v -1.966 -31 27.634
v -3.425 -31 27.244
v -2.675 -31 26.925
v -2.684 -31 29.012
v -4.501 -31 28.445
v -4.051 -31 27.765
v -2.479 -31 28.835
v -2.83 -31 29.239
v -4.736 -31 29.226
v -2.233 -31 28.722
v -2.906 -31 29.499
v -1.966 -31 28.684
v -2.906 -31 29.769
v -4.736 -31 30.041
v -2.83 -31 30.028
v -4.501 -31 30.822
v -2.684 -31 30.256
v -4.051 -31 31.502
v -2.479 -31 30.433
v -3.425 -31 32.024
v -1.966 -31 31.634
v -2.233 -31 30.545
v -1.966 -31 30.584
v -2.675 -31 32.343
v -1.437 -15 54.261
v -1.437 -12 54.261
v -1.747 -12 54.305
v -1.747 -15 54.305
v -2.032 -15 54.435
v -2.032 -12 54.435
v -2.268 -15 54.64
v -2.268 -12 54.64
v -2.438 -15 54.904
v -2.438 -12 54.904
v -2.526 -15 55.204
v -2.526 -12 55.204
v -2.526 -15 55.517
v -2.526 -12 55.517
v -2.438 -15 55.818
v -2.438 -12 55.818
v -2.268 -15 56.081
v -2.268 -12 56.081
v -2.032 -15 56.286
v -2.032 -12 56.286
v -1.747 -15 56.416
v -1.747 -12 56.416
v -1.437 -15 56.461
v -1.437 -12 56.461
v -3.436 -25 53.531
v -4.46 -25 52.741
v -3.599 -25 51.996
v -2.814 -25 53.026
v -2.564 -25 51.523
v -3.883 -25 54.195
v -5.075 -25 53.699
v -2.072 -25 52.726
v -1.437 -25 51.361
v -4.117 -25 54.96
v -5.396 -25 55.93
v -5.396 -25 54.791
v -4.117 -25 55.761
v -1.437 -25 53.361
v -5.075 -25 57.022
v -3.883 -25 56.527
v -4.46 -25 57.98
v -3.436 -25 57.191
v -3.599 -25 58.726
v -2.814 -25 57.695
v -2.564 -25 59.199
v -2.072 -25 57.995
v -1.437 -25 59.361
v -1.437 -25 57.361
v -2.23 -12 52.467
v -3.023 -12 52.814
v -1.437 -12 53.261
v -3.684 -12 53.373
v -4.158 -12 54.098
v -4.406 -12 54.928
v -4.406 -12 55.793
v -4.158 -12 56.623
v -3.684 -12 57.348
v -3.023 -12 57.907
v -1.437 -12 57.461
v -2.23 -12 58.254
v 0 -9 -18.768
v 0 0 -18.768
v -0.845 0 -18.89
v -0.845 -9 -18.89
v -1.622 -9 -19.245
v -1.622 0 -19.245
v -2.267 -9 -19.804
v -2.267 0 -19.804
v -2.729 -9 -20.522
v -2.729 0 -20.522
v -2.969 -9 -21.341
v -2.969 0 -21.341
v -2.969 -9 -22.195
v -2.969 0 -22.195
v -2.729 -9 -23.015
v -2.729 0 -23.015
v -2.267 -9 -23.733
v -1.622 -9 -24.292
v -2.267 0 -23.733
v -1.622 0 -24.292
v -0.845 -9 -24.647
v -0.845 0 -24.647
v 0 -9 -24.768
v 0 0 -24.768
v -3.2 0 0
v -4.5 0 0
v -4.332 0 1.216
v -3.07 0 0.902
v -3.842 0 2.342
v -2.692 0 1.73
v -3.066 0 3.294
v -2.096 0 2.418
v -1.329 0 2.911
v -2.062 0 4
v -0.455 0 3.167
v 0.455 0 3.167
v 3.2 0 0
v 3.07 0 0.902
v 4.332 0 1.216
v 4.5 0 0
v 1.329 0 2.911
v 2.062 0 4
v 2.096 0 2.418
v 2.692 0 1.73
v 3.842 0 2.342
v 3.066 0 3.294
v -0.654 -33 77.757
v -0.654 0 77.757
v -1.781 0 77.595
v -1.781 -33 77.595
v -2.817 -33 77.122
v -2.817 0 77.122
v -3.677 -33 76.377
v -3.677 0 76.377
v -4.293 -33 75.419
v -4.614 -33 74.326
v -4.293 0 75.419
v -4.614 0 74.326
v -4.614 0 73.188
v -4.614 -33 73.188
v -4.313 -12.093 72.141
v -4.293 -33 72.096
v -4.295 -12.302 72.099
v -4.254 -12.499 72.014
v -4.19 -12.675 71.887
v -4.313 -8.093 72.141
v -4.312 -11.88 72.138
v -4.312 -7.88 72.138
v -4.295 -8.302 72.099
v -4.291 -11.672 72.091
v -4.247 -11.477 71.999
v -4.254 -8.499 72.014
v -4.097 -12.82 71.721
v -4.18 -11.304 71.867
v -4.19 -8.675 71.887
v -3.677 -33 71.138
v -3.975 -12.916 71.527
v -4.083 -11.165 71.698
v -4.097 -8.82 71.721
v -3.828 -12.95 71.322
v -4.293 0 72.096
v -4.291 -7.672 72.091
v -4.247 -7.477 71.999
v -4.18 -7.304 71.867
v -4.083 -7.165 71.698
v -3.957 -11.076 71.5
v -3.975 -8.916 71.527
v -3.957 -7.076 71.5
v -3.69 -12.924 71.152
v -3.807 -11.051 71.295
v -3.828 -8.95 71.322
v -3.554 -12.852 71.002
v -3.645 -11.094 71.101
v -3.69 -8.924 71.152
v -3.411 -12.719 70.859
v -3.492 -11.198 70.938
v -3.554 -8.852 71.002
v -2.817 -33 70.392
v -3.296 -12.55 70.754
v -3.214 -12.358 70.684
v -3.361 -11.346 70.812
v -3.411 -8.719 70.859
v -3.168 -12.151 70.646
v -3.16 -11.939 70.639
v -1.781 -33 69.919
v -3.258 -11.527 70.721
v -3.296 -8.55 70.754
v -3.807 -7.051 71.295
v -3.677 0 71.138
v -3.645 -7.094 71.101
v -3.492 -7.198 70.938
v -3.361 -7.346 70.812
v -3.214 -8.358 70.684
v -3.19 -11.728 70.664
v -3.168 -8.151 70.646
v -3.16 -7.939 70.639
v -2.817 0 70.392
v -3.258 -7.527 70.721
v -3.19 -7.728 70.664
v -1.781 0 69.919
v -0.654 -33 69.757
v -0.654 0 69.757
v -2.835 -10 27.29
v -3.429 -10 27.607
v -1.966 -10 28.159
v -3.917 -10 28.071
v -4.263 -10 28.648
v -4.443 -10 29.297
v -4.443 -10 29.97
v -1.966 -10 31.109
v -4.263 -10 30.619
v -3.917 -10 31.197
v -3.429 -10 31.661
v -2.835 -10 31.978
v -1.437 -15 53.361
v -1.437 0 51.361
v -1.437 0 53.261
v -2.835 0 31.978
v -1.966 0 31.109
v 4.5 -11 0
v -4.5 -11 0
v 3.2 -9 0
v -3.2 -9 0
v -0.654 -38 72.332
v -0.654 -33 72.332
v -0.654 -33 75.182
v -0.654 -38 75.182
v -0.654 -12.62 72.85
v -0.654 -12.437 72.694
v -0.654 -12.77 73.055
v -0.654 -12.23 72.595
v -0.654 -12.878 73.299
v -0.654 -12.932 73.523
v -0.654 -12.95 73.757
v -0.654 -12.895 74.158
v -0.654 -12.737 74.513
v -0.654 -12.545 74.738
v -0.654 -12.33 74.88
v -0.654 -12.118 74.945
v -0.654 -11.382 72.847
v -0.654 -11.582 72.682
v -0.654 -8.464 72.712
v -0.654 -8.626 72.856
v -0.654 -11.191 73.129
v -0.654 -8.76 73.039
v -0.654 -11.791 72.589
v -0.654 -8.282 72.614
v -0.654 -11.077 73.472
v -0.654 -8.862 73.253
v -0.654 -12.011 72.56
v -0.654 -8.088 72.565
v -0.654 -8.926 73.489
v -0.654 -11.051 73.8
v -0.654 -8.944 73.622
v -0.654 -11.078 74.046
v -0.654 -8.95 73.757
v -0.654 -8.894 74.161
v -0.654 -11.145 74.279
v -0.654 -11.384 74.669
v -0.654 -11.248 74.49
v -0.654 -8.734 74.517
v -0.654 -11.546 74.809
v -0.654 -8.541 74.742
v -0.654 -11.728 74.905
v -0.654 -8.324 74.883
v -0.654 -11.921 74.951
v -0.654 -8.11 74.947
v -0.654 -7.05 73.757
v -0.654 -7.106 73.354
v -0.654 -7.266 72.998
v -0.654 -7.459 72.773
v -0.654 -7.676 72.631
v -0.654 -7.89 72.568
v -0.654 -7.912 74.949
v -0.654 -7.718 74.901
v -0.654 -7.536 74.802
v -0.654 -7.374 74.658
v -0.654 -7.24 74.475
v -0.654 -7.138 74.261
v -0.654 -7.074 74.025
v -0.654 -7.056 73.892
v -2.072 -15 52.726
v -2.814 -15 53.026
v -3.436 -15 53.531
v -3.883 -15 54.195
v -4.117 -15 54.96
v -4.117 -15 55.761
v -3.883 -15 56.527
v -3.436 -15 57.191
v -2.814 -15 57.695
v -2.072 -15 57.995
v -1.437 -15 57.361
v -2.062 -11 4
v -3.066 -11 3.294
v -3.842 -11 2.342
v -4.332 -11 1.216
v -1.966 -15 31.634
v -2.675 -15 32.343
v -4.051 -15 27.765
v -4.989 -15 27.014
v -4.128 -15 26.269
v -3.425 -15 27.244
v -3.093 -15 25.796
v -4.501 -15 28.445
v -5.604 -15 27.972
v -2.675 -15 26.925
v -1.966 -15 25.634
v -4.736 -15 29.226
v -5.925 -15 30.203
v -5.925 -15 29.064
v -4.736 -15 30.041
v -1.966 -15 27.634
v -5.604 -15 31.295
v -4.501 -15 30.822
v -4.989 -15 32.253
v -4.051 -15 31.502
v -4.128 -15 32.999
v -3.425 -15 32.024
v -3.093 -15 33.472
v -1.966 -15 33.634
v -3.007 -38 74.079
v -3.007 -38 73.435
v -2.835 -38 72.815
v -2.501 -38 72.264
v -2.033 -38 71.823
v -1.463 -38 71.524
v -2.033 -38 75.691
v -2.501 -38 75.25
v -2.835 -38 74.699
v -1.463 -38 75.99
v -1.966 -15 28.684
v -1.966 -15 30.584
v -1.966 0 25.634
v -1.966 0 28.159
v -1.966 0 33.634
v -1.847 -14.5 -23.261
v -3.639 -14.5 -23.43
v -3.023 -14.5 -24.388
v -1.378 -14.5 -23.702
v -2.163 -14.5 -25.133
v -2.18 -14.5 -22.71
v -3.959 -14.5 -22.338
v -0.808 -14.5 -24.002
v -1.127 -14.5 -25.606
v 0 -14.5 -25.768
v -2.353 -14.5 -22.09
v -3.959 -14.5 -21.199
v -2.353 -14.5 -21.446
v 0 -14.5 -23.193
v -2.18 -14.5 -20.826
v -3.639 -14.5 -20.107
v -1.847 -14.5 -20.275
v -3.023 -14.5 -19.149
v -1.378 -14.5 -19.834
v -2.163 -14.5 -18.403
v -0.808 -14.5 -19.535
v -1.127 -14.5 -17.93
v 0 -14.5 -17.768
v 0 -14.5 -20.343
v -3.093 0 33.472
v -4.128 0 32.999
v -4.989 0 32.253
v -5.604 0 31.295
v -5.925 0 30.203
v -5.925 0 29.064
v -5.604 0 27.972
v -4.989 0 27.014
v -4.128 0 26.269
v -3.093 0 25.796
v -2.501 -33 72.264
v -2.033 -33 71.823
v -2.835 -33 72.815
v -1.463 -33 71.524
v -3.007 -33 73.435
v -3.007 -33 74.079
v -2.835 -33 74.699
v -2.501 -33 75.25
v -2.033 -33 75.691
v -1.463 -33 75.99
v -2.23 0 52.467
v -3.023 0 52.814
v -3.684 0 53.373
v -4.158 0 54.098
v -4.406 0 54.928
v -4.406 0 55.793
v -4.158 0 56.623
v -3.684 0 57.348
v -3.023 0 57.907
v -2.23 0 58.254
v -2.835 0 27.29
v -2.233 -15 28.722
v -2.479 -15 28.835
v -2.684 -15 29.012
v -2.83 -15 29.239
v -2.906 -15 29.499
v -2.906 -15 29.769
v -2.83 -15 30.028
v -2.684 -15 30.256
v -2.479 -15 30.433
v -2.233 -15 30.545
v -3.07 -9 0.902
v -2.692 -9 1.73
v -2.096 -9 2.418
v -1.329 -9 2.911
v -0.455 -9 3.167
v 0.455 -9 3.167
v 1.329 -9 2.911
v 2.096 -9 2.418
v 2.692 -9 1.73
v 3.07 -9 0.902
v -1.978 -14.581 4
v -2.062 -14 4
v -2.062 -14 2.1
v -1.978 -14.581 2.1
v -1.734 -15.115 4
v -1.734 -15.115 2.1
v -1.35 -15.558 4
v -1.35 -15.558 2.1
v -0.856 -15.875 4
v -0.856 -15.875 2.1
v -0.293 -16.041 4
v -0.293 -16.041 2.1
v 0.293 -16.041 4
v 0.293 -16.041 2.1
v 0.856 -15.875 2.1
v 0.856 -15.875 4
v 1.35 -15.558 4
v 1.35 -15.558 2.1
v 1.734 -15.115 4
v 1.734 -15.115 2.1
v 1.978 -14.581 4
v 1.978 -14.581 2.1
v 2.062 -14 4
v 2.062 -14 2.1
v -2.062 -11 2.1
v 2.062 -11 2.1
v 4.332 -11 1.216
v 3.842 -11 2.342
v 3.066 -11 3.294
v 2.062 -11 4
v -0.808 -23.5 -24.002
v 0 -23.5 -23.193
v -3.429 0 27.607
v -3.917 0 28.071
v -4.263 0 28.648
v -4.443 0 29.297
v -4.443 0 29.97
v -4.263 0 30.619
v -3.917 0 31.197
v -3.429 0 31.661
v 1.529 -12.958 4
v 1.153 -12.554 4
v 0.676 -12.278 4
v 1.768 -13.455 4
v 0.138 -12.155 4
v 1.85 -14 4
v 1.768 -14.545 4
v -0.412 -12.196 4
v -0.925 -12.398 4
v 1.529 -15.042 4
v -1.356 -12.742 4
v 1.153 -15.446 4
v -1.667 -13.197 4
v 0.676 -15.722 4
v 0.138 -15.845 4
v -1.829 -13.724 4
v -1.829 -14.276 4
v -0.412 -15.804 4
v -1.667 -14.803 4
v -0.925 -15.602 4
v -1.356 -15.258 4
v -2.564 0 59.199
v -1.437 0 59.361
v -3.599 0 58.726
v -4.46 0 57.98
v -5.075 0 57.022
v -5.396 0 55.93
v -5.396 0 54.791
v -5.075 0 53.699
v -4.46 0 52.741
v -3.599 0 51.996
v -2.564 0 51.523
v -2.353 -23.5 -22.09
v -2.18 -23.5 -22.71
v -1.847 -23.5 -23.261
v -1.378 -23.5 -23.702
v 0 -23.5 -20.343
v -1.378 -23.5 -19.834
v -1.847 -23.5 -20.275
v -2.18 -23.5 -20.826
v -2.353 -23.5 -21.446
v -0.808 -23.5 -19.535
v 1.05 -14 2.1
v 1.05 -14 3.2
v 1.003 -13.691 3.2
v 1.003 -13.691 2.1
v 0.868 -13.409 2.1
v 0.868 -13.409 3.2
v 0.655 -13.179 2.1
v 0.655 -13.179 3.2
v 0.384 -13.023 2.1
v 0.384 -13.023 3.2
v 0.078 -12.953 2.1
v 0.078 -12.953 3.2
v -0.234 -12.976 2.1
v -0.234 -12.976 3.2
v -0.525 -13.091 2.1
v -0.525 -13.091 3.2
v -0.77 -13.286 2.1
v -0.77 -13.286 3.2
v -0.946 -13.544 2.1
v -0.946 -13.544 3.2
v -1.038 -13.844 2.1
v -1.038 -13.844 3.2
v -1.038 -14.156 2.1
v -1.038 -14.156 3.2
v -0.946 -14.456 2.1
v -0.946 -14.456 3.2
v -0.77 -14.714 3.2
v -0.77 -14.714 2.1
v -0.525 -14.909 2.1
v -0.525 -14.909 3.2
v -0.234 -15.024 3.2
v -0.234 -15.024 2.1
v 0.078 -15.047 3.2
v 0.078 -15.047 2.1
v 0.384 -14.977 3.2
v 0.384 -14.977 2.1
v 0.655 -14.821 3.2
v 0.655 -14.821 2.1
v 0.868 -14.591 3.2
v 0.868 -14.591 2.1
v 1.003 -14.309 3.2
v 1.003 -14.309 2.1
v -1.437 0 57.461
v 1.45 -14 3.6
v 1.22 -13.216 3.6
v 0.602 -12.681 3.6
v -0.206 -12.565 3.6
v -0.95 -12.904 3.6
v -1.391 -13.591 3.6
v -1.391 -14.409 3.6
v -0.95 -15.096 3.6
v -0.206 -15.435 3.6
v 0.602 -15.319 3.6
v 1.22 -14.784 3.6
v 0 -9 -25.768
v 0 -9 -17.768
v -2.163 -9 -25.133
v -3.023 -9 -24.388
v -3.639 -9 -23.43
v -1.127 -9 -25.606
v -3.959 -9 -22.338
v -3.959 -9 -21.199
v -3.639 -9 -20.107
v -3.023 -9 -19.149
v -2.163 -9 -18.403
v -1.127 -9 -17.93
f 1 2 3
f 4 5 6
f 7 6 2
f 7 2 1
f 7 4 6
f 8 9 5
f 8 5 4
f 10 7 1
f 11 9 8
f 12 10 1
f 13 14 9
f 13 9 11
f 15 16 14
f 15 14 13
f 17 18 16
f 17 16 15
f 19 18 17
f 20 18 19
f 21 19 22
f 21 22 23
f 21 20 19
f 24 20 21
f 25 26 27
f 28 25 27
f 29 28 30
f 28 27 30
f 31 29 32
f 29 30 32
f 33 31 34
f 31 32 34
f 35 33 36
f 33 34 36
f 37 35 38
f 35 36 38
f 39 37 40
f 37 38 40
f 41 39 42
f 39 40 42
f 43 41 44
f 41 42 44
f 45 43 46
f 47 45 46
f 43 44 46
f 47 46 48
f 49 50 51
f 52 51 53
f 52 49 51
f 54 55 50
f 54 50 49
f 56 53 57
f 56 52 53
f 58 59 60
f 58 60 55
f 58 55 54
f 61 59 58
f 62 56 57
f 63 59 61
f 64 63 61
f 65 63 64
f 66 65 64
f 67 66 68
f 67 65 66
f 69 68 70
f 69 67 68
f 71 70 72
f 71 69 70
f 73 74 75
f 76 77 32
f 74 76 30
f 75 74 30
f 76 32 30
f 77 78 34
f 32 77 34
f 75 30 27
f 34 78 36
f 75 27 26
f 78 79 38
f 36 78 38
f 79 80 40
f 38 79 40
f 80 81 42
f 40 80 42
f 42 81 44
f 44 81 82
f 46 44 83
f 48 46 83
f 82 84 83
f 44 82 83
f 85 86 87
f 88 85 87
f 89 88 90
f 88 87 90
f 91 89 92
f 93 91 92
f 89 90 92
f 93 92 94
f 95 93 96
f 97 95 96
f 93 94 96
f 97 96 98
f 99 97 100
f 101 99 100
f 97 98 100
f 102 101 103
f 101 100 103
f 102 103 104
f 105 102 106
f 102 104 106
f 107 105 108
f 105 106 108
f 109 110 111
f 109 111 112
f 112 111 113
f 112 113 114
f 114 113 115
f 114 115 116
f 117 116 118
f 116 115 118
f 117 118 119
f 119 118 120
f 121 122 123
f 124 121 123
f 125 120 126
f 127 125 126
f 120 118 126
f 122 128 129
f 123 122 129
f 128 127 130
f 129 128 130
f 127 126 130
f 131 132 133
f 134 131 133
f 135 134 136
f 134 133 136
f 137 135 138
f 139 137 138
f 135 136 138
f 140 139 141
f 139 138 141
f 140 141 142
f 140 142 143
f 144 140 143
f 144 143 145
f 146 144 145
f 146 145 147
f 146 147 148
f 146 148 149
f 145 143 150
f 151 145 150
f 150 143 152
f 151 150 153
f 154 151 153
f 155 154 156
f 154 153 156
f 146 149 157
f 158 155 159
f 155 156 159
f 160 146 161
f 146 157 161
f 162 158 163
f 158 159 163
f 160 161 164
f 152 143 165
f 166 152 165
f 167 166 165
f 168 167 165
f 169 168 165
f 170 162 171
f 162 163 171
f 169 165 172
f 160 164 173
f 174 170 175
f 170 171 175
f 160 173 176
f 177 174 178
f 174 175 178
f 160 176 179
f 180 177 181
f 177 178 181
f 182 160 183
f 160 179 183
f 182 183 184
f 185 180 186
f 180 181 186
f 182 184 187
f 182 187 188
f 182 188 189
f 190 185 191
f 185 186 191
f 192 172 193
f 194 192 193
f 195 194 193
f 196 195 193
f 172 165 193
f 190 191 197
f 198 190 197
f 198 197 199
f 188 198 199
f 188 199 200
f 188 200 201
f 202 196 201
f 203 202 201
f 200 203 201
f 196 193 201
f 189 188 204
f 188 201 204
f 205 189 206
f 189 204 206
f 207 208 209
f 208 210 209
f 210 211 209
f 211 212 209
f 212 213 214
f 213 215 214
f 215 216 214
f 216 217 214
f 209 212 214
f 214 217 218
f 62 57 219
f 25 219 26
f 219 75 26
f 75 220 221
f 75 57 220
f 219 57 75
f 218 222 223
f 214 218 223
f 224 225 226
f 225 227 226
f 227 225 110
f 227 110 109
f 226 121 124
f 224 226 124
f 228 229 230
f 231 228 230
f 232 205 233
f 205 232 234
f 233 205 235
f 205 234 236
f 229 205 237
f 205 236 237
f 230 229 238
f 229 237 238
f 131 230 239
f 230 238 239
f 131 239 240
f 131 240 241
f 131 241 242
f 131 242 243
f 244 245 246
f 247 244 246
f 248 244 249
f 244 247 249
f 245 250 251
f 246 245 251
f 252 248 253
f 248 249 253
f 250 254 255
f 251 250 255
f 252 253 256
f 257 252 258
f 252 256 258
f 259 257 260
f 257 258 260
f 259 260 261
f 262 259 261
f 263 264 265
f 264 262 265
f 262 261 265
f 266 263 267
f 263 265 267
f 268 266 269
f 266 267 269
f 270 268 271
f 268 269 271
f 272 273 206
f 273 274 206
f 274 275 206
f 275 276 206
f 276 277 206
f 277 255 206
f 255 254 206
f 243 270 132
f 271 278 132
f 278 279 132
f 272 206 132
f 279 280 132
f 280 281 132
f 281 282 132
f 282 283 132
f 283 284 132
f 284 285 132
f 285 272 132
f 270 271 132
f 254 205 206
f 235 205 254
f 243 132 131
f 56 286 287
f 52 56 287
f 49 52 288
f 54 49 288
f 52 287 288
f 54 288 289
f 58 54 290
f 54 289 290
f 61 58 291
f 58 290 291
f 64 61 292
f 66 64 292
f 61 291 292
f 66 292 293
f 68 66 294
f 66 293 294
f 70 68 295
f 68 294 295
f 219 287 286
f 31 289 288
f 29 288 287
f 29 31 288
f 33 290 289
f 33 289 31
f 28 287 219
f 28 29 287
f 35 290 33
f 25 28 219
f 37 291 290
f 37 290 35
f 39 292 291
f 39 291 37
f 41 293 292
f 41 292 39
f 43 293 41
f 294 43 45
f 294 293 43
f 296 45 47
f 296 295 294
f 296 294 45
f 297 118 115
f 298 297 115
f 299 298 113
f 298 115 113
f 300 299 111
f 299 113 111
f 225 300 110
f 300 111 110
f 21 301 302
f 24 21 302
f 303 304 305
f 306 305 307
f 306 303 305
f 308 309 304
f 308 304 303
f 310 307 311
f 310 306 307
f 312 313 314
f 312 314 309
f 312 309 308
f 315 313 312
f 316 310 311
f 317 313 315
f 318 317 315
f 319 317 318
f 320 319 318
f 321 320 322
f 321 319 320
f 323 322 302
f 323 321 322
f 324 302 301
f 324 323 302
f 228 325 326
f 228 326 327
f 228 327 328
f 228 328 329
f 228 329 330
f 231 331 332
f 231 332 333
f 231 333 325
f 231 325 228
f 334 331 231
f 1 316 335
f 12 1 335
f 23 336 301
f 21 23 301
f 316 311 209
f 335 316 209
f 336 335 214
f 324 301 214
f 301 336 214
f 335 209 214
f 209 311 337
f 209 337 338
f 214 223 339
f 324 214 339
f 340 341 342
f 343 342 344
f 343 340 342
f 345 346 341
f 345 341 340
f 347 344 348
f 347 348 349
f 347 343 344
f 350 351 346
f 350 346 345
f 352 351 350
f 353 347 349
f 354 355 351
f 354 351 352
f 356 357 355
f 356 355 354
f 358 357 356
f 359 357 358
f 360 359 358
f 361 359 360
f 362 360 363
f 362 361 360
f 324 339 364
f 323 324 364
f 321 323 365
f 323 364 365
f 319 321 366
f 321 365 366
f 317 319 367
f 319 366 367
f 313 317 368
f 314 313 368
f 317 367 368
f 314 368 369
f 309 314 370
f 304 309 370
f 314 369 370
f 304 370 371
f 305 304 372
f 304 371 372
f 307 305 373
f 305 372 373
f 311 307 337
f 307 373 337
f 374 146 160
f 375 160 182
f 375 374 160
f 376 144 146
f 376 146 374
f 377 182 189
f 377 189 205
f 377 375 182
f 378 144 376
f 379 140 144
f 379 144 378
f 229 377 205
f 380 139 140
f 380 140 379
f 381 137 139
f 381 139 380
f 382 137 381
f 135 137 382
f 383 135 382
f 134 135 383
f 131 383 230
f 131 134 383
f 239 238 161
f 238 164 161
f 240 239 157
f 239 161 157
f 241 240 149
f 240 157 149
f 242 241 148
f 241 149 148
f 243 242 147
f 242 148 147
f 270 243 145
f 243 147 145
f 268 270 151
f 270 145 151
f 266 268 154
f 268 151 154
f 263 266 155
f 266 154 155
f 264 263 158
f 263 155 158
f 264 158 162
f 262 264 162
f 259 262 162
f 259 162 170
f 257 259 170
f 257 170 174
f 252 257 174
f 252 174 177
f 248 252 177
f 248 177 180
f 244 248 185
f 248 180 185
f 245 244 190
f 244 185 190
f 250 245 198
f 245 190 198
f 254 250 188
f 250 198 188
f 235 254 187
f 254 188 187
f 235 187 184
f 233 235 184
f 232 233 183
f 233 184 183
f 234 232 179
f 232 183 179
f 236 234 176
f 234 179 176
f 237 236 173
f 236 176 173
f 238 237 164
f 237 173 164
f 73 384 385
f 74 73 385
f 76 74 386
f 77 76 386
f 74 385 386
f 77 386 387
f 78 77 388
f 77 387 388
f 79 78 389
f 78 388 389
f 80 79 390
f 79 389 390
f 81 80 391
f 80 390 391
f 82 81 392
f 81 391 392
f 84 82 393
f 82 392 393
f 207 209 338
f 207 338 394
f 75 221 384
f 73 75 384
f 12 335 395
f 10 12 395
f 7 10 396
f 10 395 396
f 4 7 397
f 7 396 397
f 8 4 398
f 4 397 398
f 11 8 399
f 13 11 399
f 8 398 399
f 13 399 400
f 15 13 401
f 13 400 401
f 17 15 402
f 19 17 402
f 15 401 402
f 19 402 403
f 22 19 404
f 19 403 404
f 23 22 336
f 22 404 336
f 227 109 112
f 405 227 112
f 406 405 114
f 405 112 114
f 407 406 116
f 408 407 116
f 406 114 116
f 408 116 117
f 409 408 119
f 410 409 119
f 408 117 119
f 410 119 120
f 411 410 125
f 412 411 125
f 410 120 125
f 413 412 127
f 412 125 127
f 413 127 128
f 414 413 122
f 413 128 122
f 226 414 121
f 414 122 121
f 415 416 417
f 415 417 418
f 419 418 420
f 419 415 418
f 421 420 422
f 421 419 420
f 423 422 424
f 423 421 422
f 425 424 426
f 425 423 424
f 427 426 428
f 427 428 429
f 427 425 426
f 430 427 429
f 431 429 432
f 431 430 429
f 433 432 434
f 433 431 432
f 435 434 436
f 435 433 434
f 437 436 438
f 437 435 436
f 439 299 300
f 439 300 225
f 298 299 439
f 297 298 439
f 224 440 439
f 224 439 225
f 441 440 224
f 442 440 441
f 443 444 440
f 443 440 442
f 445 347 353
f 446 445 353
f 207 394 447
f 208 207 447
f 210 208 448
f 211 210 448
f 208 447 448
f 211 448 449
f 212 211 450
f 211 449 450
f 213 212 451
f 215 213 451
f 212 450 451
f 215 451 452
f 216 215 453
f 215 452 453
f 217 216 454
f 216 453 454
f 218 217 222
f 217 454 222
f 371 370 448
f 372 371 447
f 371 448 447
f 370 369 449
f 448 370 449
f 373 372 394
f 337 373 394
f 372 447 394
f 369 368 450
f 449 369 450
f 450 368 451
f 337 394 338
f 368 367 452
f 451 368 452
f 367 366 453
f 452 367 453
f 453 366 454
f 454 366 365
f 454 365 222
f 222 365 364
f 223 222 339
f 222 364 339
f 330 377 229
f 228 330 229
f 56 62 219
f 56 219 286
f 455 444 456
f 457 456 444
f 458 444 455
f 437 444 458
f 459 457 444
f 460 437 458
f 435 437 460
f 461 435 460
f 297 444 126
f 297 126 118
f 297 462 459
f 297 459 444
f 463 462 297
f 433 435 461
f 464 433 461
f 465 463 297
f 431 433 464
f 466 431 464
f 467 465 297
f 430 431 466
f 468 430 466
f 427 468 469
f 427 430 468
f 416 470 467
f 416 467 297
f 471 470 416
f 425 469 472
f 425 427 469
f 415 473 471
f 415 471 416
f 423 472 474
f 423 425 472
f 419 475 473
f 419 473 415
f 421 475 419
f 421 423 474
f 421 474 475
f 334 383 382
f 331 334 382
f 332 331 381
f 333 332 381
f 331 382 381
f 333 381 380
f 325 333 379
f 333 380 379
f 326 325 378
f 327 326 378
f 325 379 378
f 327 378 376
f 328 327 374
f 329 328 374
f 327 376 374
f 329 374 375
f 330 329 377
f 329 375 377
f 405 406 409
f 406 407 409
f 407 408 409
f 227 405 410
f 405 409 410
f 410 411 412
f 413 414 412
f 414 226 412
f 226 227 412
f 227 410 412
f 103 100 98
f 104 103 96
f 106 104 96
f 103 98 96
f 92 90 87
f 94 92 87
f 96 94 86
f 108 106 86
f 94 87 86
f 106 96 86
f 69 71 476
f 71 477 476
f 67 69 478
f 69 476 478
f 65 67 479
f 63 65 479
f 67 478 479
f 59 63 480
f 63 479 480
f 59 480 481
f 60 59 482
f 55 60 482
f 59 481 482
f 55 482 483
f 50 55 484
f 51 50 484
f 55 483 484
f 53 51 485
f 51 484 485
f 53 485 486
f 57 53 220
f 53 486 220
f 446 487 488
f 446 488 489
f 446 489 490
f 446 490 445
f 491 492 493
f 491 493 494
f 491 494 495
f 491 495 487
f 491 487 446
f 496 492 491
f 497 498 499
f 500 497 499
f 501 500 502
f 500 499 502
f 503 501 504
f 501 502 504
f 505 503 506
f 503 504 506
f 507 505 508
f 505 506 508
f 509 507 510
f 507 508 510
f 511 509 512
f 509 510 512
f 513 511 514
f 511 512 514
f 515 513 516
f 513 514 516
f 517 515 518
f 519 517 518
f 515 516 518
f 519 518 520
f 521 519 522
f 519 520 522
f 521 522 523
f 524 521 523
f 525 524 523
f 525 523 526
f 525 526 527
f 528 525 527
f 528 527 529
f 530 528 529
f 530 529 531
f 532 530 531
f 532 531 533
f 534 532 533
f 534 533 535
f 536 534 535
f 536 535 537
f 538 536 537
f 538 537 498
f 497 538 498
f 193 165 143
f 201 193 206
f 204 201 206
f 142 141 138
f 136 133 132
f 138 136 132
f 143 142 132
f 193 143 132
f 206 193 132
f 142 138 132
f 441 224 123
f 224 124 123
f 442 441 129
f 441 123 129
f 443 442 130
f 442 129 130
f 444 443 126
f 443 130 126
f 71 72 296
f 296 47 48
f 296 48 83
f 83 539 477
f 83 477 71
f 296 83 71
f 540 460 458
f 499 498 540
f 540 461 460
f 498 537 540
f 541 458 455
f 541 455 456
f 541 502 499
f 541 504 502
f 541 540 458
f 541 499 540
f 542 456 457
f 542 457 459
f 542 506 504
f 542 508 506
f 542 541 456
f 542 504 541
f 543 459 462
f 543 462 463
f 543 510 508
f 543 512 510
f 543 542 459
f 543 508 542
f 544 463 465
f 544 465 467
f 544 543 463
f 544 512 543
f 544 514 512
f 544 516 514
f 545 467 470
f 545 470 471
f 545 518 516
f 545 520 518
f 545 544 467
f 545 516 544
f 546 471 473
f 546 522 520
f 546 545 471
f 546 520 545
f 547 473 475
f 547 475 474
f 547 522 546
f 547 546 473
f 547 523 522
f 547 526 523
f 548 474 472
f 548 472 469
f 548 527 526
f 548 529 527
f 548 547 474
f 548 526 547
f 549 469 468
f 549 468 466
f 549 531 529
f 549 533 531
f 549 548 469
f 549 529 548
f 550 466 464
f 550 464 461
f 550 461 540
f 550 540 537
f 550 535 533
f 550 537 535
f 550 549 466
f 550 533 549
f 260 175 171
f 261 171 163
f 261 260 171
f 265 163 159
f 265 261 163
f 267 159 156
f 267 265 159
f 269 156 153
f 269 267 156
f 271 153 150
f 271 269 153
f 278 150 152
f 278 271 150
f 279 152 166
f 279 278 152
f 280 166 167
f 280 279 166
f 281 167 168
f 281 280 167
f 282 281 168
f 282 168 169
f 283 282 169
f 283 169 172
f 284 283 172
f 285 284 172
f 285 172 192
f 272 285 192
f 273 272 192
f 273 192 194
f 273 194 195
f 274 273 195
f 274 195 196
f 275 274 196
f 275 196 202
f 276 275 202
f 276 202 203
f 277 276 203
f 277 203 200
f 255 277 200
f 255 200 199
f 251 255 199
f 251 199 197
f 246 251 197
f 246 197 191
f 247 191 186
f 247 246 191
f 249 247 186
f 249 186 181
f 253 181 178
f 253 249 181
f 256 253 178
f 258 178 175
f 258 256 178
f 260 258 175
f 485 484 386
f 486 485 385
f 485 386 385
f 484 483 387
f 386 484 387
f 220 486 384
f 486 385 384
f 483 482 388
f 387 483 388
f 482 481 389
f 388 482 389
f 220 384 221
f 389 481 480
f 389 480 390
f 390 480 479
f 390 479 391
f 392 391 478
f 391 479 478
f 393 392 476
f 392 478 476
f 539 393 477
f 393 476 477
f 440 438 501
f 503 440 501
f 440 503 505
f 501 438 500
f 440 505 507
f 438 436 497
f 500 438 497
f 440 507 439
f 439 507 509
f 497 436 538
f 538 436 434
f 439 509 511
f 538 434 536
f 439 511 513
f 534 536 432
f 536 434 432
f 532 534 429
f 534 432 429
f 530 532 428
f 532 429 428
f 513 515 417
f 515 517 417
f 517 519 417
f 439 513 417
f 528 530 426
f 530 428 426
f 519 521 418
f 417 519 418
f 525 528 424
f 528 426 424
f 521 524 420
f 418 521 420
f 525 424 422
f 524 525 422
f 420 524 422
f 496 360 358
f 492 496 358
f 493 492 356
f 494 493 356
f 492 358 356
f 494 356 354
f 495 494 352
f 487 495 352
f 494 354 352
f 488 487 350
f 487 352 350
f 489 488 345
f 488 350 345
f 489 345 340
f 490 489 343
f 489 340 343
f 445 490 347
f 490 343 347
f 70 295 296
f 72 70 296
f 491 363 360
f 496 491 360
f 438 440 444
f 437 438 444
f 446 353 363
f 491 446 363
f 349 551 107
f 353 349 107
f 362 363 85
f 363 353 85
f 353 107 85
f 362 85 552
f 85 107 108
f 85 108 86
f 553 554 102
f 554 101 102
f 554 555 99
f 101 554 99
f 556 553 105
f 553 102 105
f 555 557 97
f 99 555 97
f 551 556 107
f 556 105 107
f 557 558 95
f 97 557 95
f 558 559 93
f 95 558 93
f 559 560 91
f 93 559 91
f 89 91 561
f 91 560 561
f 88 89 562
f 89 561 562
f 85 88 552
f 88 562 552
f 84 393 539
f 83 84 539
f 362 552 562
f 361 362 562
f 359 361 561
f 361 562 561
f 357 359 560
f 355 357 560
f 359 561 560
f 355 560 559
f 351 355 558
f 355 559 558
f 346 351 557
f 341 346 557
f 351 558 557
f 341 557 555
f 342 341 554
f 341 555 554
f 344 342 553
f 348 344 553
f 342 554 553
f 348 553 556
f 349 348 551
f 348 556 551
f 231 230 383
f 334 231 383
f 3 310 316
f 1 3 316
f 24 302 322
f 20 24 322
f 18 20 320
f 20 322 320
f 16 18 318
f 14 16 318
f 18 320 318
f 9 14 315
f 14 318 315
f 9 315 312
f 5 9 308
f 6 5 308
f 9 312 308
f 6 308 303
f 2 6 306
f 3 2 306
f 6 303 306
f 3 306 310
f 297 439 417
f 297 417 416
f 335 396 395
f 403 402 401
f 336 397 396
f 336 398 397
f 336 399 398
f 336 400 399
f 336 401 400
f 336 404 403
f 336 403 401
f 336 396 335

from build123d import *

# Parameters (mm, degrees)
F1_DEPTH      = 9
F3_DEPTH      = 2
F4_W          = 4.1231056256
F4_H          = 1.9
F5_DEPTH      = 3
F6_W          = 2.0615528128
F6_H          = 1.9
F8_R          = 1.05
F9_DEPTH      = 2
F9_DEPTH_BACK = 25
F11_DEPTH     = 9
F13_DEPTH     = 5.5
F15_DEPTH     = 9
F17_DEPTH     = 10
F19_DEPTH     = 5
F21_DEPTH     = 16
F23_DEPTH     = 12
F25_DEPTH     = 3
F27_DEPTH     = 10
F29_DEPTH     = 33
F31_DEPTH     = 5
F32_SIZE      = 0.8
F35_R         = 0.95
F36_DEPTH     = 12.5


with BuildPart() as f1:
    # F0 (on Front) → F1 (new body)
    with BuildSketch(Plane.XZ):
        with BuildLine():
            Line((2.0615528128, 4), (0, 4))
            Line((0, 4), (-2.0615528128, 4))
            ThreePointArc((-2.0615528128, 4), (-3.8423292192, 2.3423292192), (-4.5, 0))
            Line((-4.5, 0), (-3.2, 0))
            ThreePointArc((-3.2, 0), (0, 3.2), (3.2, 0))
            Line((3.2, 0), (4.5, 0))
            ThreePointArc((4.5, 0), (3.8423292192, 2.3423292192), (2.0615528128, 4))
        make_face()
    extrude(amount=F1_DEPTH)

    # F2 (on face) → F3 (join)
    with BuildSketch(Plane.XZ.offset(9)):
        with BuildLine():
            ThreePointArc((-2.0615528128, 4), (-3.8423292192, 2.3423292192), (-4.5, 0))
            Line((-4.5, 0), (4.5, 0))
            ThreePointArc((4.5, 0), (3.8423292192, 2.3423292192), (2.0615528128, 4))
            Line((2.0615528128, 4), (-2.0615528128, 4))
        make_face()
    extrude(amount=F3_DEPTH)

    # F4 (on face) → F5 (join)
    with BuildSketch(Plane.XZ.offset(11)):
        with Locations((0, 3.05)):
            Rectangle(F4_W, F4_H)
    extrude(amount=F5_DEPTH)

    # F6 (on face) → F7 (revolve)
    with BuildSketch(Plane.XZ.offset(14)):
        with Locations((-1.0307764064, 3.05)):
            Rectangle(F6_W, F6_H)
    revolve(axis=Axis((0, -14, 3.05), (0, 0, 1)))

    # F8 (on face) → F9 (cut, two sides)
    with BuildSketch(Plane.XY.offset(4)) as f9_sk:
        with Locations((0, -14)):
            Circle(F8_R)
    extrude(amount=-F9_DEPTH, mode=Mode.SUBTRACT)
    extrude(f9_sk.sketch, amount=F9_DEPTH_BACK, mode=Mode.SUBTRACT)

    # F32
    f32_edges = [f1.edges().sort_by_distance(p)[0] for p in [
        (-1.05, -14, 4),
    ]]
    chamfer(f32_edges, length=F32_SIZE)


with BuildPart() as f11:
    # F10 (on Front) → F11 (new body)
    with BuildSketch(Plane.XZ):
        with BuildLine():
            ThreePointArc((0, -18.768345058), (-3, -21.768345058), (0, -24.768345058))
            Line((0, -24.768345058), (0, -18.768345058))
        make_face()
    extrude(amount=F11_DEPTH)

    # F12 (on face) → F13 (join)
    with BuildSketch(Plane.XZ.offset(9)):
        with BuildLine():
            Line((0, -18.768345058), (0, -17.768345058))
            ThreePointArc((0, -17.768345058), (-4, -21.768345058), (0, -25.768345058))
            Line((0, -25.768345058), (0, -24.768345058))
            ThreePointArc((0, -24.768345058), (-3, -21.768345058), (0, -18.768345058))
        make_face()
        with BuildLine():
            Line((0, -24.768345058), (0, -18.768345058))
            ThreePointArc((0, -18.768345058), (-3, -21.768345058), (0, -24.768345058))
        make_face()
    extrude(amount=F13_DEPTH)

    # F14 (on face) → F15 (join)
    with BuildSketch(Plane.XZ.offset(14.5)):
        with BuildLine():
            Line((0, -23.193345058), (0, -21.768345058))
            Line((0, -21.768345058), (0, -20.343345058))
            Line((0, -20.343345058), (-0.8082420064, -19.5351030516))
            ThreePointArc((-0.8082420064, -19.5351030516), (-2.375, -21.768345058), (-0.8082420064, -24.0015870644))
            Line((-0.8082420064, -24.0015870644), (0, -23.193345058))
        make_face()
    extrude(amount=F15_DEPTH)


with BuildPart() as f17:
    # F16 (on Front) → F17 (new body)
    with BuildSketch(Plane.XZ):
        with BuildLine():
            Line((-1.9657567435, 28.1587075442), (-2.8348350173, 27.2896292704))
            ThreePointArc((-2.8348350173, 27.2896292704), (-4.4657567435, 29.6337075442), (-2.8348350173, 31.9777858181))
            Line((-2.8348350173, 31.9777858181), (-1.9657567435, 31.1087075442))
            Line((-1.9657567435, 31.1087075442), (-1.9657567435, 33.6337075442))
            ThreePointArc((-1.9657567435, 33.6337075442), (-5.9657567435, 29.6337075442), (-1.9657567435, 25.6337075442))
            Line((-1.9657567435, 25.6337075442), (-1.9657567435, 28.1587075442))
        make_face()
    extrude(amount=F17_DEPTH)

    # F18 (on face) → F19 (join)
    with BuildSketch(Plane.XZ.offset(10)):
        with BuildLine():
            Line((-2.8348350173, 27.2896292704), (-1.9657567435, 28.1587075442))
            Line((-1.9657567435, 28.1587075442), (-1.9657567435, 31.1087075442))
            Line((-1.9657567435, 31.1087075442), (-2.8348350173, 31.9777858181))
            ThreePointArc((-2.8348350173, 31.9777858181), (-4.4657567435, 29.6337075442), (-2.8348350173, 27.2896292704))
        make_face()
        with BuildLine():
            Line((-1.9657567435, 25.6337075442), (-1.9657567435, 28.1587075442))
            Line((-1.9657567435, 28.1587075442), (-2.8348350173, 27.2896292704))
            ThreePointArc((-2.8348350173, 27.2896292704), (-4.4657567435, 29.6337075442), (-2.8348350173, 31.9777858181))
            Line((-2.8348350173, 31.9777858181), (-1.9657567435, 31.1087075442))
            Line((-1.9657567435, 31.1087075442), (-1.9657567435, 33.6337075442))
            ThreePointArc((-1.9657567435, 33.6337075442), (-5.9657567435, 29.6337075442), (-1.9657567435, 25.6337075442))
        make_face()
    extrude(amount=F19_DEPTH)

    # F20 (on face) → F21 (join)
    with BuildSketch(Plane.XZ.offset(15)):
        with BuildLine():
            Line((-1.9657567435, 31.6337075442), (-2.6745574926, 32.3425082933))
            ThreePointArc((-2.6745574926, 32.3425082933), (-4.7657567435, 29.6337075442), (-2.6745574926, 26.9249067951))
            Line((-2.6745574926, 26.9249067951), (-1.9657567435, 27.6337075442))
            Line((-1.9657567435, 27.6337075442), (-1.9657567435, 28.6837075442))
            ThreePointArc((-1.9657567435, 28.6837075442), (-2.9157567435, 29.6337075442), (-1.9657567435, 30.5837075442))
            Line((-1.9657567435, 30.5837075442), (-1.9657567435, 31.6337075442))
        make_face()
    extrude(amount=F21_DEPTH)


with BuildPart() as f23:
    # F22 (on Front) → F23 (new body)
    with BuildSketch(Plane.XZ):
        with BuildLine():
            Line((-1.436933299, 53.2605685294), (-2.2301641581, 52.4673376703))
            ThreePointArc((-2.2301641581, 52.4673376703), (-4.436933299, 55.3605685294), (-2.2301641581, 58.2537993885))
            Line((-2.2301641581, 58.2537993885), (-1.436933299, 57.4605685294))
            Line((-1.436933299, 57.4605685294), (-1.436933299, 59.3605685294))
            ThreePointArc((-1.436933299, 59.3605685294), (-5.436933299, 55.3605685294), (-1.436933299, 51.3605685294))
            Line((-1.436933299, 51.3605685294), (-1.436933299, 53.2605685294))
        make_face()
    extrude(amount=F23_DEPTH)

    # F24 (on face) → F25 (join)
    with BuildSketch(Plane.XZ.offset(12)):
        with BuildLine():
            Line((-2.2301641581, 52.4673376703), (-1.436933299, 53.2605685294))
            Line((-1.436933299, 53.2605685294), (-1.436933299, 54.2605685294))
            ThreePointArc((-1.436933299, 54.2605685294), (-2.536933299, 55.3605685294), (-1.436933299, 56.4605685294))
            Line((-1.436933299, 56.4605685294), (-1.436933299, 57.4605685294))
            Line((-1.436933299, 57.4605685294), (-2.2301641581, 58.2537993885))
            ThreePointArc((-2.2301641581, 58.2537993885), (-4.436933299, 55.3605685294), (-2.2301641581, 52.4673376703))
        make_face()
        with BuildLine():
            Line((-1.436933299, 51.3605685294), (-1.436933299, 53.2605685294))
            Line((-1.436933299, 53.2605685294), (-2.2301641581, 52.4673376703))
            ThreePointArc((-2.2301641581, 52.4673376703), (-4.436933299, 55.3605685294), (-2.2301641581, 58.2537993885))
            Line((-2.2301641581, 58.2537993885), (-1.436933299, 57.4605685294))
            Line((-1.436933299, 57.4605685294), (-1.436933299, 59.3605685294))
            ThreePointArc((-1.436933299, 59.3605685294), (-5.436933299, 55.3605685294), (-1.436933299, 51.3605685294))
        make_face()
    extrude(amount=F25_DEPTH)

    # F26 (on face) → F27 (join)
    with BuildSketch(Plane.XZ.offset(15)):
        with BuildLine():
            Line((-2.0715739323, 57.9952091627), (-1.436933299, 57.3605685294))
            Line((-1.436933299, 57.3605685294), (-1.436933299, 59.3605685294))
            ThreePointArc((-1.436933299, 59.3605685294), (-5.436933299, 55.3605685294), (-1.436933299, 51.3605685294))
            Line((-1.436933299, 51.3605685294), (-1.436933299, 53.3605685294))
            Line((-1.436933299, 53.3605685294), (-2.0715739323, 52.7259278961))
            ThreePointArc((-2.0715739323, 52.7259278961), (-4.146933299, 55.3605685294), (-2.0715739323, 57.9952091627))
        make_face()
    extrude(amount=F27_DEPTH)


with BuildPart() as f29:
    # F28 (on Front) → F29 (new body)
    with BuildSketch(Plane.XZ):
        with BuildLine():
            Line((-0.6543450763, 72.3321891785), (-0.6543450763, 73.7571891785))
            Line((-0.6543450763, 73.7571891785), (-0.6543450763, 75.1821891785))
            Line((-0.6543450763, 75.1821891785), (-1.4625870826, 75.9904311849))
            ThreePointArc((-1.4625870826, 75.9904311849), (-3.0293450763, 73.7571891785), (-1.4625870826, 71.5239471721))
            Line((-1.4625870826, 71.5239471721), (-0.6543450763, 72.3321891785))
        make_face()
        with BuildLine():
            Line((-0.6543450763, 69.7571891785), (-0.6543450763, 72.3321891785))
            Line((-0.6543450763, 72.3321891785), (-1.4625870826, 71.5239471721))
            ThreePointArc((-1.4625870826, 71.5239471721), (-3.0293450763, 73.7571891785), (-1.4625870826, 75.9904311849))
            Line((-1.4625870826, 75.9904311849), (-0.6543450763, 75.1821891785))
            Line((-0.6543450763, 75.1821891785), (-0.6543450763, 77.7571891785))
            ThreePointArc((-0.6543450763, 77.7571891785), (-4.6543450763, 73.7571891785), (-0.6543450763, 69.7571891785))
        make_face()
    extrude(amount=F29_DEPTH)

    # F30 (on face) → F31 (join)
    with BuildSketch(Plane.XZ.offset(33)):
        with BuildLine():
            ThreePointArc((-1.4625870826, 75.9904311849), (-3.0293450763, 73.7571891785), (-1.4625870826, 71.5239471721))
            Line((-1.4625870826, 71.5239471721), (-0.6543450763, 72.3321891785))
            Line((-0.6543450763, 72.3321891785), (-0.6543450763, 75.1821891785))
            Line((-0.6543450763, 75.1821891785), (-1.4625870826, 75.9904311849))
        make_face()
    extrude(amount=F31_DEPTH)

    # F35 (on line) → F36 (cut, symmetric)
    with BuildSketch(Plane(origin=(35.210135929, 0, 27.0176875487), x_dir=(0, -1, 0), z_dir=(-0.7933533403, 0, -0.608761429))):
        with Locations((8, 58.9138524489)):
            Circle(F35_R)
        with Locations((12, 58.9138524489)):
            Circle(F35_R)
    extrude(amount=F36_DEPTH, both=True, mode=Mode.SUBTRACT)


solid = Compound([f1.part, f11.part, f17.part, f23.part, f29.part])
